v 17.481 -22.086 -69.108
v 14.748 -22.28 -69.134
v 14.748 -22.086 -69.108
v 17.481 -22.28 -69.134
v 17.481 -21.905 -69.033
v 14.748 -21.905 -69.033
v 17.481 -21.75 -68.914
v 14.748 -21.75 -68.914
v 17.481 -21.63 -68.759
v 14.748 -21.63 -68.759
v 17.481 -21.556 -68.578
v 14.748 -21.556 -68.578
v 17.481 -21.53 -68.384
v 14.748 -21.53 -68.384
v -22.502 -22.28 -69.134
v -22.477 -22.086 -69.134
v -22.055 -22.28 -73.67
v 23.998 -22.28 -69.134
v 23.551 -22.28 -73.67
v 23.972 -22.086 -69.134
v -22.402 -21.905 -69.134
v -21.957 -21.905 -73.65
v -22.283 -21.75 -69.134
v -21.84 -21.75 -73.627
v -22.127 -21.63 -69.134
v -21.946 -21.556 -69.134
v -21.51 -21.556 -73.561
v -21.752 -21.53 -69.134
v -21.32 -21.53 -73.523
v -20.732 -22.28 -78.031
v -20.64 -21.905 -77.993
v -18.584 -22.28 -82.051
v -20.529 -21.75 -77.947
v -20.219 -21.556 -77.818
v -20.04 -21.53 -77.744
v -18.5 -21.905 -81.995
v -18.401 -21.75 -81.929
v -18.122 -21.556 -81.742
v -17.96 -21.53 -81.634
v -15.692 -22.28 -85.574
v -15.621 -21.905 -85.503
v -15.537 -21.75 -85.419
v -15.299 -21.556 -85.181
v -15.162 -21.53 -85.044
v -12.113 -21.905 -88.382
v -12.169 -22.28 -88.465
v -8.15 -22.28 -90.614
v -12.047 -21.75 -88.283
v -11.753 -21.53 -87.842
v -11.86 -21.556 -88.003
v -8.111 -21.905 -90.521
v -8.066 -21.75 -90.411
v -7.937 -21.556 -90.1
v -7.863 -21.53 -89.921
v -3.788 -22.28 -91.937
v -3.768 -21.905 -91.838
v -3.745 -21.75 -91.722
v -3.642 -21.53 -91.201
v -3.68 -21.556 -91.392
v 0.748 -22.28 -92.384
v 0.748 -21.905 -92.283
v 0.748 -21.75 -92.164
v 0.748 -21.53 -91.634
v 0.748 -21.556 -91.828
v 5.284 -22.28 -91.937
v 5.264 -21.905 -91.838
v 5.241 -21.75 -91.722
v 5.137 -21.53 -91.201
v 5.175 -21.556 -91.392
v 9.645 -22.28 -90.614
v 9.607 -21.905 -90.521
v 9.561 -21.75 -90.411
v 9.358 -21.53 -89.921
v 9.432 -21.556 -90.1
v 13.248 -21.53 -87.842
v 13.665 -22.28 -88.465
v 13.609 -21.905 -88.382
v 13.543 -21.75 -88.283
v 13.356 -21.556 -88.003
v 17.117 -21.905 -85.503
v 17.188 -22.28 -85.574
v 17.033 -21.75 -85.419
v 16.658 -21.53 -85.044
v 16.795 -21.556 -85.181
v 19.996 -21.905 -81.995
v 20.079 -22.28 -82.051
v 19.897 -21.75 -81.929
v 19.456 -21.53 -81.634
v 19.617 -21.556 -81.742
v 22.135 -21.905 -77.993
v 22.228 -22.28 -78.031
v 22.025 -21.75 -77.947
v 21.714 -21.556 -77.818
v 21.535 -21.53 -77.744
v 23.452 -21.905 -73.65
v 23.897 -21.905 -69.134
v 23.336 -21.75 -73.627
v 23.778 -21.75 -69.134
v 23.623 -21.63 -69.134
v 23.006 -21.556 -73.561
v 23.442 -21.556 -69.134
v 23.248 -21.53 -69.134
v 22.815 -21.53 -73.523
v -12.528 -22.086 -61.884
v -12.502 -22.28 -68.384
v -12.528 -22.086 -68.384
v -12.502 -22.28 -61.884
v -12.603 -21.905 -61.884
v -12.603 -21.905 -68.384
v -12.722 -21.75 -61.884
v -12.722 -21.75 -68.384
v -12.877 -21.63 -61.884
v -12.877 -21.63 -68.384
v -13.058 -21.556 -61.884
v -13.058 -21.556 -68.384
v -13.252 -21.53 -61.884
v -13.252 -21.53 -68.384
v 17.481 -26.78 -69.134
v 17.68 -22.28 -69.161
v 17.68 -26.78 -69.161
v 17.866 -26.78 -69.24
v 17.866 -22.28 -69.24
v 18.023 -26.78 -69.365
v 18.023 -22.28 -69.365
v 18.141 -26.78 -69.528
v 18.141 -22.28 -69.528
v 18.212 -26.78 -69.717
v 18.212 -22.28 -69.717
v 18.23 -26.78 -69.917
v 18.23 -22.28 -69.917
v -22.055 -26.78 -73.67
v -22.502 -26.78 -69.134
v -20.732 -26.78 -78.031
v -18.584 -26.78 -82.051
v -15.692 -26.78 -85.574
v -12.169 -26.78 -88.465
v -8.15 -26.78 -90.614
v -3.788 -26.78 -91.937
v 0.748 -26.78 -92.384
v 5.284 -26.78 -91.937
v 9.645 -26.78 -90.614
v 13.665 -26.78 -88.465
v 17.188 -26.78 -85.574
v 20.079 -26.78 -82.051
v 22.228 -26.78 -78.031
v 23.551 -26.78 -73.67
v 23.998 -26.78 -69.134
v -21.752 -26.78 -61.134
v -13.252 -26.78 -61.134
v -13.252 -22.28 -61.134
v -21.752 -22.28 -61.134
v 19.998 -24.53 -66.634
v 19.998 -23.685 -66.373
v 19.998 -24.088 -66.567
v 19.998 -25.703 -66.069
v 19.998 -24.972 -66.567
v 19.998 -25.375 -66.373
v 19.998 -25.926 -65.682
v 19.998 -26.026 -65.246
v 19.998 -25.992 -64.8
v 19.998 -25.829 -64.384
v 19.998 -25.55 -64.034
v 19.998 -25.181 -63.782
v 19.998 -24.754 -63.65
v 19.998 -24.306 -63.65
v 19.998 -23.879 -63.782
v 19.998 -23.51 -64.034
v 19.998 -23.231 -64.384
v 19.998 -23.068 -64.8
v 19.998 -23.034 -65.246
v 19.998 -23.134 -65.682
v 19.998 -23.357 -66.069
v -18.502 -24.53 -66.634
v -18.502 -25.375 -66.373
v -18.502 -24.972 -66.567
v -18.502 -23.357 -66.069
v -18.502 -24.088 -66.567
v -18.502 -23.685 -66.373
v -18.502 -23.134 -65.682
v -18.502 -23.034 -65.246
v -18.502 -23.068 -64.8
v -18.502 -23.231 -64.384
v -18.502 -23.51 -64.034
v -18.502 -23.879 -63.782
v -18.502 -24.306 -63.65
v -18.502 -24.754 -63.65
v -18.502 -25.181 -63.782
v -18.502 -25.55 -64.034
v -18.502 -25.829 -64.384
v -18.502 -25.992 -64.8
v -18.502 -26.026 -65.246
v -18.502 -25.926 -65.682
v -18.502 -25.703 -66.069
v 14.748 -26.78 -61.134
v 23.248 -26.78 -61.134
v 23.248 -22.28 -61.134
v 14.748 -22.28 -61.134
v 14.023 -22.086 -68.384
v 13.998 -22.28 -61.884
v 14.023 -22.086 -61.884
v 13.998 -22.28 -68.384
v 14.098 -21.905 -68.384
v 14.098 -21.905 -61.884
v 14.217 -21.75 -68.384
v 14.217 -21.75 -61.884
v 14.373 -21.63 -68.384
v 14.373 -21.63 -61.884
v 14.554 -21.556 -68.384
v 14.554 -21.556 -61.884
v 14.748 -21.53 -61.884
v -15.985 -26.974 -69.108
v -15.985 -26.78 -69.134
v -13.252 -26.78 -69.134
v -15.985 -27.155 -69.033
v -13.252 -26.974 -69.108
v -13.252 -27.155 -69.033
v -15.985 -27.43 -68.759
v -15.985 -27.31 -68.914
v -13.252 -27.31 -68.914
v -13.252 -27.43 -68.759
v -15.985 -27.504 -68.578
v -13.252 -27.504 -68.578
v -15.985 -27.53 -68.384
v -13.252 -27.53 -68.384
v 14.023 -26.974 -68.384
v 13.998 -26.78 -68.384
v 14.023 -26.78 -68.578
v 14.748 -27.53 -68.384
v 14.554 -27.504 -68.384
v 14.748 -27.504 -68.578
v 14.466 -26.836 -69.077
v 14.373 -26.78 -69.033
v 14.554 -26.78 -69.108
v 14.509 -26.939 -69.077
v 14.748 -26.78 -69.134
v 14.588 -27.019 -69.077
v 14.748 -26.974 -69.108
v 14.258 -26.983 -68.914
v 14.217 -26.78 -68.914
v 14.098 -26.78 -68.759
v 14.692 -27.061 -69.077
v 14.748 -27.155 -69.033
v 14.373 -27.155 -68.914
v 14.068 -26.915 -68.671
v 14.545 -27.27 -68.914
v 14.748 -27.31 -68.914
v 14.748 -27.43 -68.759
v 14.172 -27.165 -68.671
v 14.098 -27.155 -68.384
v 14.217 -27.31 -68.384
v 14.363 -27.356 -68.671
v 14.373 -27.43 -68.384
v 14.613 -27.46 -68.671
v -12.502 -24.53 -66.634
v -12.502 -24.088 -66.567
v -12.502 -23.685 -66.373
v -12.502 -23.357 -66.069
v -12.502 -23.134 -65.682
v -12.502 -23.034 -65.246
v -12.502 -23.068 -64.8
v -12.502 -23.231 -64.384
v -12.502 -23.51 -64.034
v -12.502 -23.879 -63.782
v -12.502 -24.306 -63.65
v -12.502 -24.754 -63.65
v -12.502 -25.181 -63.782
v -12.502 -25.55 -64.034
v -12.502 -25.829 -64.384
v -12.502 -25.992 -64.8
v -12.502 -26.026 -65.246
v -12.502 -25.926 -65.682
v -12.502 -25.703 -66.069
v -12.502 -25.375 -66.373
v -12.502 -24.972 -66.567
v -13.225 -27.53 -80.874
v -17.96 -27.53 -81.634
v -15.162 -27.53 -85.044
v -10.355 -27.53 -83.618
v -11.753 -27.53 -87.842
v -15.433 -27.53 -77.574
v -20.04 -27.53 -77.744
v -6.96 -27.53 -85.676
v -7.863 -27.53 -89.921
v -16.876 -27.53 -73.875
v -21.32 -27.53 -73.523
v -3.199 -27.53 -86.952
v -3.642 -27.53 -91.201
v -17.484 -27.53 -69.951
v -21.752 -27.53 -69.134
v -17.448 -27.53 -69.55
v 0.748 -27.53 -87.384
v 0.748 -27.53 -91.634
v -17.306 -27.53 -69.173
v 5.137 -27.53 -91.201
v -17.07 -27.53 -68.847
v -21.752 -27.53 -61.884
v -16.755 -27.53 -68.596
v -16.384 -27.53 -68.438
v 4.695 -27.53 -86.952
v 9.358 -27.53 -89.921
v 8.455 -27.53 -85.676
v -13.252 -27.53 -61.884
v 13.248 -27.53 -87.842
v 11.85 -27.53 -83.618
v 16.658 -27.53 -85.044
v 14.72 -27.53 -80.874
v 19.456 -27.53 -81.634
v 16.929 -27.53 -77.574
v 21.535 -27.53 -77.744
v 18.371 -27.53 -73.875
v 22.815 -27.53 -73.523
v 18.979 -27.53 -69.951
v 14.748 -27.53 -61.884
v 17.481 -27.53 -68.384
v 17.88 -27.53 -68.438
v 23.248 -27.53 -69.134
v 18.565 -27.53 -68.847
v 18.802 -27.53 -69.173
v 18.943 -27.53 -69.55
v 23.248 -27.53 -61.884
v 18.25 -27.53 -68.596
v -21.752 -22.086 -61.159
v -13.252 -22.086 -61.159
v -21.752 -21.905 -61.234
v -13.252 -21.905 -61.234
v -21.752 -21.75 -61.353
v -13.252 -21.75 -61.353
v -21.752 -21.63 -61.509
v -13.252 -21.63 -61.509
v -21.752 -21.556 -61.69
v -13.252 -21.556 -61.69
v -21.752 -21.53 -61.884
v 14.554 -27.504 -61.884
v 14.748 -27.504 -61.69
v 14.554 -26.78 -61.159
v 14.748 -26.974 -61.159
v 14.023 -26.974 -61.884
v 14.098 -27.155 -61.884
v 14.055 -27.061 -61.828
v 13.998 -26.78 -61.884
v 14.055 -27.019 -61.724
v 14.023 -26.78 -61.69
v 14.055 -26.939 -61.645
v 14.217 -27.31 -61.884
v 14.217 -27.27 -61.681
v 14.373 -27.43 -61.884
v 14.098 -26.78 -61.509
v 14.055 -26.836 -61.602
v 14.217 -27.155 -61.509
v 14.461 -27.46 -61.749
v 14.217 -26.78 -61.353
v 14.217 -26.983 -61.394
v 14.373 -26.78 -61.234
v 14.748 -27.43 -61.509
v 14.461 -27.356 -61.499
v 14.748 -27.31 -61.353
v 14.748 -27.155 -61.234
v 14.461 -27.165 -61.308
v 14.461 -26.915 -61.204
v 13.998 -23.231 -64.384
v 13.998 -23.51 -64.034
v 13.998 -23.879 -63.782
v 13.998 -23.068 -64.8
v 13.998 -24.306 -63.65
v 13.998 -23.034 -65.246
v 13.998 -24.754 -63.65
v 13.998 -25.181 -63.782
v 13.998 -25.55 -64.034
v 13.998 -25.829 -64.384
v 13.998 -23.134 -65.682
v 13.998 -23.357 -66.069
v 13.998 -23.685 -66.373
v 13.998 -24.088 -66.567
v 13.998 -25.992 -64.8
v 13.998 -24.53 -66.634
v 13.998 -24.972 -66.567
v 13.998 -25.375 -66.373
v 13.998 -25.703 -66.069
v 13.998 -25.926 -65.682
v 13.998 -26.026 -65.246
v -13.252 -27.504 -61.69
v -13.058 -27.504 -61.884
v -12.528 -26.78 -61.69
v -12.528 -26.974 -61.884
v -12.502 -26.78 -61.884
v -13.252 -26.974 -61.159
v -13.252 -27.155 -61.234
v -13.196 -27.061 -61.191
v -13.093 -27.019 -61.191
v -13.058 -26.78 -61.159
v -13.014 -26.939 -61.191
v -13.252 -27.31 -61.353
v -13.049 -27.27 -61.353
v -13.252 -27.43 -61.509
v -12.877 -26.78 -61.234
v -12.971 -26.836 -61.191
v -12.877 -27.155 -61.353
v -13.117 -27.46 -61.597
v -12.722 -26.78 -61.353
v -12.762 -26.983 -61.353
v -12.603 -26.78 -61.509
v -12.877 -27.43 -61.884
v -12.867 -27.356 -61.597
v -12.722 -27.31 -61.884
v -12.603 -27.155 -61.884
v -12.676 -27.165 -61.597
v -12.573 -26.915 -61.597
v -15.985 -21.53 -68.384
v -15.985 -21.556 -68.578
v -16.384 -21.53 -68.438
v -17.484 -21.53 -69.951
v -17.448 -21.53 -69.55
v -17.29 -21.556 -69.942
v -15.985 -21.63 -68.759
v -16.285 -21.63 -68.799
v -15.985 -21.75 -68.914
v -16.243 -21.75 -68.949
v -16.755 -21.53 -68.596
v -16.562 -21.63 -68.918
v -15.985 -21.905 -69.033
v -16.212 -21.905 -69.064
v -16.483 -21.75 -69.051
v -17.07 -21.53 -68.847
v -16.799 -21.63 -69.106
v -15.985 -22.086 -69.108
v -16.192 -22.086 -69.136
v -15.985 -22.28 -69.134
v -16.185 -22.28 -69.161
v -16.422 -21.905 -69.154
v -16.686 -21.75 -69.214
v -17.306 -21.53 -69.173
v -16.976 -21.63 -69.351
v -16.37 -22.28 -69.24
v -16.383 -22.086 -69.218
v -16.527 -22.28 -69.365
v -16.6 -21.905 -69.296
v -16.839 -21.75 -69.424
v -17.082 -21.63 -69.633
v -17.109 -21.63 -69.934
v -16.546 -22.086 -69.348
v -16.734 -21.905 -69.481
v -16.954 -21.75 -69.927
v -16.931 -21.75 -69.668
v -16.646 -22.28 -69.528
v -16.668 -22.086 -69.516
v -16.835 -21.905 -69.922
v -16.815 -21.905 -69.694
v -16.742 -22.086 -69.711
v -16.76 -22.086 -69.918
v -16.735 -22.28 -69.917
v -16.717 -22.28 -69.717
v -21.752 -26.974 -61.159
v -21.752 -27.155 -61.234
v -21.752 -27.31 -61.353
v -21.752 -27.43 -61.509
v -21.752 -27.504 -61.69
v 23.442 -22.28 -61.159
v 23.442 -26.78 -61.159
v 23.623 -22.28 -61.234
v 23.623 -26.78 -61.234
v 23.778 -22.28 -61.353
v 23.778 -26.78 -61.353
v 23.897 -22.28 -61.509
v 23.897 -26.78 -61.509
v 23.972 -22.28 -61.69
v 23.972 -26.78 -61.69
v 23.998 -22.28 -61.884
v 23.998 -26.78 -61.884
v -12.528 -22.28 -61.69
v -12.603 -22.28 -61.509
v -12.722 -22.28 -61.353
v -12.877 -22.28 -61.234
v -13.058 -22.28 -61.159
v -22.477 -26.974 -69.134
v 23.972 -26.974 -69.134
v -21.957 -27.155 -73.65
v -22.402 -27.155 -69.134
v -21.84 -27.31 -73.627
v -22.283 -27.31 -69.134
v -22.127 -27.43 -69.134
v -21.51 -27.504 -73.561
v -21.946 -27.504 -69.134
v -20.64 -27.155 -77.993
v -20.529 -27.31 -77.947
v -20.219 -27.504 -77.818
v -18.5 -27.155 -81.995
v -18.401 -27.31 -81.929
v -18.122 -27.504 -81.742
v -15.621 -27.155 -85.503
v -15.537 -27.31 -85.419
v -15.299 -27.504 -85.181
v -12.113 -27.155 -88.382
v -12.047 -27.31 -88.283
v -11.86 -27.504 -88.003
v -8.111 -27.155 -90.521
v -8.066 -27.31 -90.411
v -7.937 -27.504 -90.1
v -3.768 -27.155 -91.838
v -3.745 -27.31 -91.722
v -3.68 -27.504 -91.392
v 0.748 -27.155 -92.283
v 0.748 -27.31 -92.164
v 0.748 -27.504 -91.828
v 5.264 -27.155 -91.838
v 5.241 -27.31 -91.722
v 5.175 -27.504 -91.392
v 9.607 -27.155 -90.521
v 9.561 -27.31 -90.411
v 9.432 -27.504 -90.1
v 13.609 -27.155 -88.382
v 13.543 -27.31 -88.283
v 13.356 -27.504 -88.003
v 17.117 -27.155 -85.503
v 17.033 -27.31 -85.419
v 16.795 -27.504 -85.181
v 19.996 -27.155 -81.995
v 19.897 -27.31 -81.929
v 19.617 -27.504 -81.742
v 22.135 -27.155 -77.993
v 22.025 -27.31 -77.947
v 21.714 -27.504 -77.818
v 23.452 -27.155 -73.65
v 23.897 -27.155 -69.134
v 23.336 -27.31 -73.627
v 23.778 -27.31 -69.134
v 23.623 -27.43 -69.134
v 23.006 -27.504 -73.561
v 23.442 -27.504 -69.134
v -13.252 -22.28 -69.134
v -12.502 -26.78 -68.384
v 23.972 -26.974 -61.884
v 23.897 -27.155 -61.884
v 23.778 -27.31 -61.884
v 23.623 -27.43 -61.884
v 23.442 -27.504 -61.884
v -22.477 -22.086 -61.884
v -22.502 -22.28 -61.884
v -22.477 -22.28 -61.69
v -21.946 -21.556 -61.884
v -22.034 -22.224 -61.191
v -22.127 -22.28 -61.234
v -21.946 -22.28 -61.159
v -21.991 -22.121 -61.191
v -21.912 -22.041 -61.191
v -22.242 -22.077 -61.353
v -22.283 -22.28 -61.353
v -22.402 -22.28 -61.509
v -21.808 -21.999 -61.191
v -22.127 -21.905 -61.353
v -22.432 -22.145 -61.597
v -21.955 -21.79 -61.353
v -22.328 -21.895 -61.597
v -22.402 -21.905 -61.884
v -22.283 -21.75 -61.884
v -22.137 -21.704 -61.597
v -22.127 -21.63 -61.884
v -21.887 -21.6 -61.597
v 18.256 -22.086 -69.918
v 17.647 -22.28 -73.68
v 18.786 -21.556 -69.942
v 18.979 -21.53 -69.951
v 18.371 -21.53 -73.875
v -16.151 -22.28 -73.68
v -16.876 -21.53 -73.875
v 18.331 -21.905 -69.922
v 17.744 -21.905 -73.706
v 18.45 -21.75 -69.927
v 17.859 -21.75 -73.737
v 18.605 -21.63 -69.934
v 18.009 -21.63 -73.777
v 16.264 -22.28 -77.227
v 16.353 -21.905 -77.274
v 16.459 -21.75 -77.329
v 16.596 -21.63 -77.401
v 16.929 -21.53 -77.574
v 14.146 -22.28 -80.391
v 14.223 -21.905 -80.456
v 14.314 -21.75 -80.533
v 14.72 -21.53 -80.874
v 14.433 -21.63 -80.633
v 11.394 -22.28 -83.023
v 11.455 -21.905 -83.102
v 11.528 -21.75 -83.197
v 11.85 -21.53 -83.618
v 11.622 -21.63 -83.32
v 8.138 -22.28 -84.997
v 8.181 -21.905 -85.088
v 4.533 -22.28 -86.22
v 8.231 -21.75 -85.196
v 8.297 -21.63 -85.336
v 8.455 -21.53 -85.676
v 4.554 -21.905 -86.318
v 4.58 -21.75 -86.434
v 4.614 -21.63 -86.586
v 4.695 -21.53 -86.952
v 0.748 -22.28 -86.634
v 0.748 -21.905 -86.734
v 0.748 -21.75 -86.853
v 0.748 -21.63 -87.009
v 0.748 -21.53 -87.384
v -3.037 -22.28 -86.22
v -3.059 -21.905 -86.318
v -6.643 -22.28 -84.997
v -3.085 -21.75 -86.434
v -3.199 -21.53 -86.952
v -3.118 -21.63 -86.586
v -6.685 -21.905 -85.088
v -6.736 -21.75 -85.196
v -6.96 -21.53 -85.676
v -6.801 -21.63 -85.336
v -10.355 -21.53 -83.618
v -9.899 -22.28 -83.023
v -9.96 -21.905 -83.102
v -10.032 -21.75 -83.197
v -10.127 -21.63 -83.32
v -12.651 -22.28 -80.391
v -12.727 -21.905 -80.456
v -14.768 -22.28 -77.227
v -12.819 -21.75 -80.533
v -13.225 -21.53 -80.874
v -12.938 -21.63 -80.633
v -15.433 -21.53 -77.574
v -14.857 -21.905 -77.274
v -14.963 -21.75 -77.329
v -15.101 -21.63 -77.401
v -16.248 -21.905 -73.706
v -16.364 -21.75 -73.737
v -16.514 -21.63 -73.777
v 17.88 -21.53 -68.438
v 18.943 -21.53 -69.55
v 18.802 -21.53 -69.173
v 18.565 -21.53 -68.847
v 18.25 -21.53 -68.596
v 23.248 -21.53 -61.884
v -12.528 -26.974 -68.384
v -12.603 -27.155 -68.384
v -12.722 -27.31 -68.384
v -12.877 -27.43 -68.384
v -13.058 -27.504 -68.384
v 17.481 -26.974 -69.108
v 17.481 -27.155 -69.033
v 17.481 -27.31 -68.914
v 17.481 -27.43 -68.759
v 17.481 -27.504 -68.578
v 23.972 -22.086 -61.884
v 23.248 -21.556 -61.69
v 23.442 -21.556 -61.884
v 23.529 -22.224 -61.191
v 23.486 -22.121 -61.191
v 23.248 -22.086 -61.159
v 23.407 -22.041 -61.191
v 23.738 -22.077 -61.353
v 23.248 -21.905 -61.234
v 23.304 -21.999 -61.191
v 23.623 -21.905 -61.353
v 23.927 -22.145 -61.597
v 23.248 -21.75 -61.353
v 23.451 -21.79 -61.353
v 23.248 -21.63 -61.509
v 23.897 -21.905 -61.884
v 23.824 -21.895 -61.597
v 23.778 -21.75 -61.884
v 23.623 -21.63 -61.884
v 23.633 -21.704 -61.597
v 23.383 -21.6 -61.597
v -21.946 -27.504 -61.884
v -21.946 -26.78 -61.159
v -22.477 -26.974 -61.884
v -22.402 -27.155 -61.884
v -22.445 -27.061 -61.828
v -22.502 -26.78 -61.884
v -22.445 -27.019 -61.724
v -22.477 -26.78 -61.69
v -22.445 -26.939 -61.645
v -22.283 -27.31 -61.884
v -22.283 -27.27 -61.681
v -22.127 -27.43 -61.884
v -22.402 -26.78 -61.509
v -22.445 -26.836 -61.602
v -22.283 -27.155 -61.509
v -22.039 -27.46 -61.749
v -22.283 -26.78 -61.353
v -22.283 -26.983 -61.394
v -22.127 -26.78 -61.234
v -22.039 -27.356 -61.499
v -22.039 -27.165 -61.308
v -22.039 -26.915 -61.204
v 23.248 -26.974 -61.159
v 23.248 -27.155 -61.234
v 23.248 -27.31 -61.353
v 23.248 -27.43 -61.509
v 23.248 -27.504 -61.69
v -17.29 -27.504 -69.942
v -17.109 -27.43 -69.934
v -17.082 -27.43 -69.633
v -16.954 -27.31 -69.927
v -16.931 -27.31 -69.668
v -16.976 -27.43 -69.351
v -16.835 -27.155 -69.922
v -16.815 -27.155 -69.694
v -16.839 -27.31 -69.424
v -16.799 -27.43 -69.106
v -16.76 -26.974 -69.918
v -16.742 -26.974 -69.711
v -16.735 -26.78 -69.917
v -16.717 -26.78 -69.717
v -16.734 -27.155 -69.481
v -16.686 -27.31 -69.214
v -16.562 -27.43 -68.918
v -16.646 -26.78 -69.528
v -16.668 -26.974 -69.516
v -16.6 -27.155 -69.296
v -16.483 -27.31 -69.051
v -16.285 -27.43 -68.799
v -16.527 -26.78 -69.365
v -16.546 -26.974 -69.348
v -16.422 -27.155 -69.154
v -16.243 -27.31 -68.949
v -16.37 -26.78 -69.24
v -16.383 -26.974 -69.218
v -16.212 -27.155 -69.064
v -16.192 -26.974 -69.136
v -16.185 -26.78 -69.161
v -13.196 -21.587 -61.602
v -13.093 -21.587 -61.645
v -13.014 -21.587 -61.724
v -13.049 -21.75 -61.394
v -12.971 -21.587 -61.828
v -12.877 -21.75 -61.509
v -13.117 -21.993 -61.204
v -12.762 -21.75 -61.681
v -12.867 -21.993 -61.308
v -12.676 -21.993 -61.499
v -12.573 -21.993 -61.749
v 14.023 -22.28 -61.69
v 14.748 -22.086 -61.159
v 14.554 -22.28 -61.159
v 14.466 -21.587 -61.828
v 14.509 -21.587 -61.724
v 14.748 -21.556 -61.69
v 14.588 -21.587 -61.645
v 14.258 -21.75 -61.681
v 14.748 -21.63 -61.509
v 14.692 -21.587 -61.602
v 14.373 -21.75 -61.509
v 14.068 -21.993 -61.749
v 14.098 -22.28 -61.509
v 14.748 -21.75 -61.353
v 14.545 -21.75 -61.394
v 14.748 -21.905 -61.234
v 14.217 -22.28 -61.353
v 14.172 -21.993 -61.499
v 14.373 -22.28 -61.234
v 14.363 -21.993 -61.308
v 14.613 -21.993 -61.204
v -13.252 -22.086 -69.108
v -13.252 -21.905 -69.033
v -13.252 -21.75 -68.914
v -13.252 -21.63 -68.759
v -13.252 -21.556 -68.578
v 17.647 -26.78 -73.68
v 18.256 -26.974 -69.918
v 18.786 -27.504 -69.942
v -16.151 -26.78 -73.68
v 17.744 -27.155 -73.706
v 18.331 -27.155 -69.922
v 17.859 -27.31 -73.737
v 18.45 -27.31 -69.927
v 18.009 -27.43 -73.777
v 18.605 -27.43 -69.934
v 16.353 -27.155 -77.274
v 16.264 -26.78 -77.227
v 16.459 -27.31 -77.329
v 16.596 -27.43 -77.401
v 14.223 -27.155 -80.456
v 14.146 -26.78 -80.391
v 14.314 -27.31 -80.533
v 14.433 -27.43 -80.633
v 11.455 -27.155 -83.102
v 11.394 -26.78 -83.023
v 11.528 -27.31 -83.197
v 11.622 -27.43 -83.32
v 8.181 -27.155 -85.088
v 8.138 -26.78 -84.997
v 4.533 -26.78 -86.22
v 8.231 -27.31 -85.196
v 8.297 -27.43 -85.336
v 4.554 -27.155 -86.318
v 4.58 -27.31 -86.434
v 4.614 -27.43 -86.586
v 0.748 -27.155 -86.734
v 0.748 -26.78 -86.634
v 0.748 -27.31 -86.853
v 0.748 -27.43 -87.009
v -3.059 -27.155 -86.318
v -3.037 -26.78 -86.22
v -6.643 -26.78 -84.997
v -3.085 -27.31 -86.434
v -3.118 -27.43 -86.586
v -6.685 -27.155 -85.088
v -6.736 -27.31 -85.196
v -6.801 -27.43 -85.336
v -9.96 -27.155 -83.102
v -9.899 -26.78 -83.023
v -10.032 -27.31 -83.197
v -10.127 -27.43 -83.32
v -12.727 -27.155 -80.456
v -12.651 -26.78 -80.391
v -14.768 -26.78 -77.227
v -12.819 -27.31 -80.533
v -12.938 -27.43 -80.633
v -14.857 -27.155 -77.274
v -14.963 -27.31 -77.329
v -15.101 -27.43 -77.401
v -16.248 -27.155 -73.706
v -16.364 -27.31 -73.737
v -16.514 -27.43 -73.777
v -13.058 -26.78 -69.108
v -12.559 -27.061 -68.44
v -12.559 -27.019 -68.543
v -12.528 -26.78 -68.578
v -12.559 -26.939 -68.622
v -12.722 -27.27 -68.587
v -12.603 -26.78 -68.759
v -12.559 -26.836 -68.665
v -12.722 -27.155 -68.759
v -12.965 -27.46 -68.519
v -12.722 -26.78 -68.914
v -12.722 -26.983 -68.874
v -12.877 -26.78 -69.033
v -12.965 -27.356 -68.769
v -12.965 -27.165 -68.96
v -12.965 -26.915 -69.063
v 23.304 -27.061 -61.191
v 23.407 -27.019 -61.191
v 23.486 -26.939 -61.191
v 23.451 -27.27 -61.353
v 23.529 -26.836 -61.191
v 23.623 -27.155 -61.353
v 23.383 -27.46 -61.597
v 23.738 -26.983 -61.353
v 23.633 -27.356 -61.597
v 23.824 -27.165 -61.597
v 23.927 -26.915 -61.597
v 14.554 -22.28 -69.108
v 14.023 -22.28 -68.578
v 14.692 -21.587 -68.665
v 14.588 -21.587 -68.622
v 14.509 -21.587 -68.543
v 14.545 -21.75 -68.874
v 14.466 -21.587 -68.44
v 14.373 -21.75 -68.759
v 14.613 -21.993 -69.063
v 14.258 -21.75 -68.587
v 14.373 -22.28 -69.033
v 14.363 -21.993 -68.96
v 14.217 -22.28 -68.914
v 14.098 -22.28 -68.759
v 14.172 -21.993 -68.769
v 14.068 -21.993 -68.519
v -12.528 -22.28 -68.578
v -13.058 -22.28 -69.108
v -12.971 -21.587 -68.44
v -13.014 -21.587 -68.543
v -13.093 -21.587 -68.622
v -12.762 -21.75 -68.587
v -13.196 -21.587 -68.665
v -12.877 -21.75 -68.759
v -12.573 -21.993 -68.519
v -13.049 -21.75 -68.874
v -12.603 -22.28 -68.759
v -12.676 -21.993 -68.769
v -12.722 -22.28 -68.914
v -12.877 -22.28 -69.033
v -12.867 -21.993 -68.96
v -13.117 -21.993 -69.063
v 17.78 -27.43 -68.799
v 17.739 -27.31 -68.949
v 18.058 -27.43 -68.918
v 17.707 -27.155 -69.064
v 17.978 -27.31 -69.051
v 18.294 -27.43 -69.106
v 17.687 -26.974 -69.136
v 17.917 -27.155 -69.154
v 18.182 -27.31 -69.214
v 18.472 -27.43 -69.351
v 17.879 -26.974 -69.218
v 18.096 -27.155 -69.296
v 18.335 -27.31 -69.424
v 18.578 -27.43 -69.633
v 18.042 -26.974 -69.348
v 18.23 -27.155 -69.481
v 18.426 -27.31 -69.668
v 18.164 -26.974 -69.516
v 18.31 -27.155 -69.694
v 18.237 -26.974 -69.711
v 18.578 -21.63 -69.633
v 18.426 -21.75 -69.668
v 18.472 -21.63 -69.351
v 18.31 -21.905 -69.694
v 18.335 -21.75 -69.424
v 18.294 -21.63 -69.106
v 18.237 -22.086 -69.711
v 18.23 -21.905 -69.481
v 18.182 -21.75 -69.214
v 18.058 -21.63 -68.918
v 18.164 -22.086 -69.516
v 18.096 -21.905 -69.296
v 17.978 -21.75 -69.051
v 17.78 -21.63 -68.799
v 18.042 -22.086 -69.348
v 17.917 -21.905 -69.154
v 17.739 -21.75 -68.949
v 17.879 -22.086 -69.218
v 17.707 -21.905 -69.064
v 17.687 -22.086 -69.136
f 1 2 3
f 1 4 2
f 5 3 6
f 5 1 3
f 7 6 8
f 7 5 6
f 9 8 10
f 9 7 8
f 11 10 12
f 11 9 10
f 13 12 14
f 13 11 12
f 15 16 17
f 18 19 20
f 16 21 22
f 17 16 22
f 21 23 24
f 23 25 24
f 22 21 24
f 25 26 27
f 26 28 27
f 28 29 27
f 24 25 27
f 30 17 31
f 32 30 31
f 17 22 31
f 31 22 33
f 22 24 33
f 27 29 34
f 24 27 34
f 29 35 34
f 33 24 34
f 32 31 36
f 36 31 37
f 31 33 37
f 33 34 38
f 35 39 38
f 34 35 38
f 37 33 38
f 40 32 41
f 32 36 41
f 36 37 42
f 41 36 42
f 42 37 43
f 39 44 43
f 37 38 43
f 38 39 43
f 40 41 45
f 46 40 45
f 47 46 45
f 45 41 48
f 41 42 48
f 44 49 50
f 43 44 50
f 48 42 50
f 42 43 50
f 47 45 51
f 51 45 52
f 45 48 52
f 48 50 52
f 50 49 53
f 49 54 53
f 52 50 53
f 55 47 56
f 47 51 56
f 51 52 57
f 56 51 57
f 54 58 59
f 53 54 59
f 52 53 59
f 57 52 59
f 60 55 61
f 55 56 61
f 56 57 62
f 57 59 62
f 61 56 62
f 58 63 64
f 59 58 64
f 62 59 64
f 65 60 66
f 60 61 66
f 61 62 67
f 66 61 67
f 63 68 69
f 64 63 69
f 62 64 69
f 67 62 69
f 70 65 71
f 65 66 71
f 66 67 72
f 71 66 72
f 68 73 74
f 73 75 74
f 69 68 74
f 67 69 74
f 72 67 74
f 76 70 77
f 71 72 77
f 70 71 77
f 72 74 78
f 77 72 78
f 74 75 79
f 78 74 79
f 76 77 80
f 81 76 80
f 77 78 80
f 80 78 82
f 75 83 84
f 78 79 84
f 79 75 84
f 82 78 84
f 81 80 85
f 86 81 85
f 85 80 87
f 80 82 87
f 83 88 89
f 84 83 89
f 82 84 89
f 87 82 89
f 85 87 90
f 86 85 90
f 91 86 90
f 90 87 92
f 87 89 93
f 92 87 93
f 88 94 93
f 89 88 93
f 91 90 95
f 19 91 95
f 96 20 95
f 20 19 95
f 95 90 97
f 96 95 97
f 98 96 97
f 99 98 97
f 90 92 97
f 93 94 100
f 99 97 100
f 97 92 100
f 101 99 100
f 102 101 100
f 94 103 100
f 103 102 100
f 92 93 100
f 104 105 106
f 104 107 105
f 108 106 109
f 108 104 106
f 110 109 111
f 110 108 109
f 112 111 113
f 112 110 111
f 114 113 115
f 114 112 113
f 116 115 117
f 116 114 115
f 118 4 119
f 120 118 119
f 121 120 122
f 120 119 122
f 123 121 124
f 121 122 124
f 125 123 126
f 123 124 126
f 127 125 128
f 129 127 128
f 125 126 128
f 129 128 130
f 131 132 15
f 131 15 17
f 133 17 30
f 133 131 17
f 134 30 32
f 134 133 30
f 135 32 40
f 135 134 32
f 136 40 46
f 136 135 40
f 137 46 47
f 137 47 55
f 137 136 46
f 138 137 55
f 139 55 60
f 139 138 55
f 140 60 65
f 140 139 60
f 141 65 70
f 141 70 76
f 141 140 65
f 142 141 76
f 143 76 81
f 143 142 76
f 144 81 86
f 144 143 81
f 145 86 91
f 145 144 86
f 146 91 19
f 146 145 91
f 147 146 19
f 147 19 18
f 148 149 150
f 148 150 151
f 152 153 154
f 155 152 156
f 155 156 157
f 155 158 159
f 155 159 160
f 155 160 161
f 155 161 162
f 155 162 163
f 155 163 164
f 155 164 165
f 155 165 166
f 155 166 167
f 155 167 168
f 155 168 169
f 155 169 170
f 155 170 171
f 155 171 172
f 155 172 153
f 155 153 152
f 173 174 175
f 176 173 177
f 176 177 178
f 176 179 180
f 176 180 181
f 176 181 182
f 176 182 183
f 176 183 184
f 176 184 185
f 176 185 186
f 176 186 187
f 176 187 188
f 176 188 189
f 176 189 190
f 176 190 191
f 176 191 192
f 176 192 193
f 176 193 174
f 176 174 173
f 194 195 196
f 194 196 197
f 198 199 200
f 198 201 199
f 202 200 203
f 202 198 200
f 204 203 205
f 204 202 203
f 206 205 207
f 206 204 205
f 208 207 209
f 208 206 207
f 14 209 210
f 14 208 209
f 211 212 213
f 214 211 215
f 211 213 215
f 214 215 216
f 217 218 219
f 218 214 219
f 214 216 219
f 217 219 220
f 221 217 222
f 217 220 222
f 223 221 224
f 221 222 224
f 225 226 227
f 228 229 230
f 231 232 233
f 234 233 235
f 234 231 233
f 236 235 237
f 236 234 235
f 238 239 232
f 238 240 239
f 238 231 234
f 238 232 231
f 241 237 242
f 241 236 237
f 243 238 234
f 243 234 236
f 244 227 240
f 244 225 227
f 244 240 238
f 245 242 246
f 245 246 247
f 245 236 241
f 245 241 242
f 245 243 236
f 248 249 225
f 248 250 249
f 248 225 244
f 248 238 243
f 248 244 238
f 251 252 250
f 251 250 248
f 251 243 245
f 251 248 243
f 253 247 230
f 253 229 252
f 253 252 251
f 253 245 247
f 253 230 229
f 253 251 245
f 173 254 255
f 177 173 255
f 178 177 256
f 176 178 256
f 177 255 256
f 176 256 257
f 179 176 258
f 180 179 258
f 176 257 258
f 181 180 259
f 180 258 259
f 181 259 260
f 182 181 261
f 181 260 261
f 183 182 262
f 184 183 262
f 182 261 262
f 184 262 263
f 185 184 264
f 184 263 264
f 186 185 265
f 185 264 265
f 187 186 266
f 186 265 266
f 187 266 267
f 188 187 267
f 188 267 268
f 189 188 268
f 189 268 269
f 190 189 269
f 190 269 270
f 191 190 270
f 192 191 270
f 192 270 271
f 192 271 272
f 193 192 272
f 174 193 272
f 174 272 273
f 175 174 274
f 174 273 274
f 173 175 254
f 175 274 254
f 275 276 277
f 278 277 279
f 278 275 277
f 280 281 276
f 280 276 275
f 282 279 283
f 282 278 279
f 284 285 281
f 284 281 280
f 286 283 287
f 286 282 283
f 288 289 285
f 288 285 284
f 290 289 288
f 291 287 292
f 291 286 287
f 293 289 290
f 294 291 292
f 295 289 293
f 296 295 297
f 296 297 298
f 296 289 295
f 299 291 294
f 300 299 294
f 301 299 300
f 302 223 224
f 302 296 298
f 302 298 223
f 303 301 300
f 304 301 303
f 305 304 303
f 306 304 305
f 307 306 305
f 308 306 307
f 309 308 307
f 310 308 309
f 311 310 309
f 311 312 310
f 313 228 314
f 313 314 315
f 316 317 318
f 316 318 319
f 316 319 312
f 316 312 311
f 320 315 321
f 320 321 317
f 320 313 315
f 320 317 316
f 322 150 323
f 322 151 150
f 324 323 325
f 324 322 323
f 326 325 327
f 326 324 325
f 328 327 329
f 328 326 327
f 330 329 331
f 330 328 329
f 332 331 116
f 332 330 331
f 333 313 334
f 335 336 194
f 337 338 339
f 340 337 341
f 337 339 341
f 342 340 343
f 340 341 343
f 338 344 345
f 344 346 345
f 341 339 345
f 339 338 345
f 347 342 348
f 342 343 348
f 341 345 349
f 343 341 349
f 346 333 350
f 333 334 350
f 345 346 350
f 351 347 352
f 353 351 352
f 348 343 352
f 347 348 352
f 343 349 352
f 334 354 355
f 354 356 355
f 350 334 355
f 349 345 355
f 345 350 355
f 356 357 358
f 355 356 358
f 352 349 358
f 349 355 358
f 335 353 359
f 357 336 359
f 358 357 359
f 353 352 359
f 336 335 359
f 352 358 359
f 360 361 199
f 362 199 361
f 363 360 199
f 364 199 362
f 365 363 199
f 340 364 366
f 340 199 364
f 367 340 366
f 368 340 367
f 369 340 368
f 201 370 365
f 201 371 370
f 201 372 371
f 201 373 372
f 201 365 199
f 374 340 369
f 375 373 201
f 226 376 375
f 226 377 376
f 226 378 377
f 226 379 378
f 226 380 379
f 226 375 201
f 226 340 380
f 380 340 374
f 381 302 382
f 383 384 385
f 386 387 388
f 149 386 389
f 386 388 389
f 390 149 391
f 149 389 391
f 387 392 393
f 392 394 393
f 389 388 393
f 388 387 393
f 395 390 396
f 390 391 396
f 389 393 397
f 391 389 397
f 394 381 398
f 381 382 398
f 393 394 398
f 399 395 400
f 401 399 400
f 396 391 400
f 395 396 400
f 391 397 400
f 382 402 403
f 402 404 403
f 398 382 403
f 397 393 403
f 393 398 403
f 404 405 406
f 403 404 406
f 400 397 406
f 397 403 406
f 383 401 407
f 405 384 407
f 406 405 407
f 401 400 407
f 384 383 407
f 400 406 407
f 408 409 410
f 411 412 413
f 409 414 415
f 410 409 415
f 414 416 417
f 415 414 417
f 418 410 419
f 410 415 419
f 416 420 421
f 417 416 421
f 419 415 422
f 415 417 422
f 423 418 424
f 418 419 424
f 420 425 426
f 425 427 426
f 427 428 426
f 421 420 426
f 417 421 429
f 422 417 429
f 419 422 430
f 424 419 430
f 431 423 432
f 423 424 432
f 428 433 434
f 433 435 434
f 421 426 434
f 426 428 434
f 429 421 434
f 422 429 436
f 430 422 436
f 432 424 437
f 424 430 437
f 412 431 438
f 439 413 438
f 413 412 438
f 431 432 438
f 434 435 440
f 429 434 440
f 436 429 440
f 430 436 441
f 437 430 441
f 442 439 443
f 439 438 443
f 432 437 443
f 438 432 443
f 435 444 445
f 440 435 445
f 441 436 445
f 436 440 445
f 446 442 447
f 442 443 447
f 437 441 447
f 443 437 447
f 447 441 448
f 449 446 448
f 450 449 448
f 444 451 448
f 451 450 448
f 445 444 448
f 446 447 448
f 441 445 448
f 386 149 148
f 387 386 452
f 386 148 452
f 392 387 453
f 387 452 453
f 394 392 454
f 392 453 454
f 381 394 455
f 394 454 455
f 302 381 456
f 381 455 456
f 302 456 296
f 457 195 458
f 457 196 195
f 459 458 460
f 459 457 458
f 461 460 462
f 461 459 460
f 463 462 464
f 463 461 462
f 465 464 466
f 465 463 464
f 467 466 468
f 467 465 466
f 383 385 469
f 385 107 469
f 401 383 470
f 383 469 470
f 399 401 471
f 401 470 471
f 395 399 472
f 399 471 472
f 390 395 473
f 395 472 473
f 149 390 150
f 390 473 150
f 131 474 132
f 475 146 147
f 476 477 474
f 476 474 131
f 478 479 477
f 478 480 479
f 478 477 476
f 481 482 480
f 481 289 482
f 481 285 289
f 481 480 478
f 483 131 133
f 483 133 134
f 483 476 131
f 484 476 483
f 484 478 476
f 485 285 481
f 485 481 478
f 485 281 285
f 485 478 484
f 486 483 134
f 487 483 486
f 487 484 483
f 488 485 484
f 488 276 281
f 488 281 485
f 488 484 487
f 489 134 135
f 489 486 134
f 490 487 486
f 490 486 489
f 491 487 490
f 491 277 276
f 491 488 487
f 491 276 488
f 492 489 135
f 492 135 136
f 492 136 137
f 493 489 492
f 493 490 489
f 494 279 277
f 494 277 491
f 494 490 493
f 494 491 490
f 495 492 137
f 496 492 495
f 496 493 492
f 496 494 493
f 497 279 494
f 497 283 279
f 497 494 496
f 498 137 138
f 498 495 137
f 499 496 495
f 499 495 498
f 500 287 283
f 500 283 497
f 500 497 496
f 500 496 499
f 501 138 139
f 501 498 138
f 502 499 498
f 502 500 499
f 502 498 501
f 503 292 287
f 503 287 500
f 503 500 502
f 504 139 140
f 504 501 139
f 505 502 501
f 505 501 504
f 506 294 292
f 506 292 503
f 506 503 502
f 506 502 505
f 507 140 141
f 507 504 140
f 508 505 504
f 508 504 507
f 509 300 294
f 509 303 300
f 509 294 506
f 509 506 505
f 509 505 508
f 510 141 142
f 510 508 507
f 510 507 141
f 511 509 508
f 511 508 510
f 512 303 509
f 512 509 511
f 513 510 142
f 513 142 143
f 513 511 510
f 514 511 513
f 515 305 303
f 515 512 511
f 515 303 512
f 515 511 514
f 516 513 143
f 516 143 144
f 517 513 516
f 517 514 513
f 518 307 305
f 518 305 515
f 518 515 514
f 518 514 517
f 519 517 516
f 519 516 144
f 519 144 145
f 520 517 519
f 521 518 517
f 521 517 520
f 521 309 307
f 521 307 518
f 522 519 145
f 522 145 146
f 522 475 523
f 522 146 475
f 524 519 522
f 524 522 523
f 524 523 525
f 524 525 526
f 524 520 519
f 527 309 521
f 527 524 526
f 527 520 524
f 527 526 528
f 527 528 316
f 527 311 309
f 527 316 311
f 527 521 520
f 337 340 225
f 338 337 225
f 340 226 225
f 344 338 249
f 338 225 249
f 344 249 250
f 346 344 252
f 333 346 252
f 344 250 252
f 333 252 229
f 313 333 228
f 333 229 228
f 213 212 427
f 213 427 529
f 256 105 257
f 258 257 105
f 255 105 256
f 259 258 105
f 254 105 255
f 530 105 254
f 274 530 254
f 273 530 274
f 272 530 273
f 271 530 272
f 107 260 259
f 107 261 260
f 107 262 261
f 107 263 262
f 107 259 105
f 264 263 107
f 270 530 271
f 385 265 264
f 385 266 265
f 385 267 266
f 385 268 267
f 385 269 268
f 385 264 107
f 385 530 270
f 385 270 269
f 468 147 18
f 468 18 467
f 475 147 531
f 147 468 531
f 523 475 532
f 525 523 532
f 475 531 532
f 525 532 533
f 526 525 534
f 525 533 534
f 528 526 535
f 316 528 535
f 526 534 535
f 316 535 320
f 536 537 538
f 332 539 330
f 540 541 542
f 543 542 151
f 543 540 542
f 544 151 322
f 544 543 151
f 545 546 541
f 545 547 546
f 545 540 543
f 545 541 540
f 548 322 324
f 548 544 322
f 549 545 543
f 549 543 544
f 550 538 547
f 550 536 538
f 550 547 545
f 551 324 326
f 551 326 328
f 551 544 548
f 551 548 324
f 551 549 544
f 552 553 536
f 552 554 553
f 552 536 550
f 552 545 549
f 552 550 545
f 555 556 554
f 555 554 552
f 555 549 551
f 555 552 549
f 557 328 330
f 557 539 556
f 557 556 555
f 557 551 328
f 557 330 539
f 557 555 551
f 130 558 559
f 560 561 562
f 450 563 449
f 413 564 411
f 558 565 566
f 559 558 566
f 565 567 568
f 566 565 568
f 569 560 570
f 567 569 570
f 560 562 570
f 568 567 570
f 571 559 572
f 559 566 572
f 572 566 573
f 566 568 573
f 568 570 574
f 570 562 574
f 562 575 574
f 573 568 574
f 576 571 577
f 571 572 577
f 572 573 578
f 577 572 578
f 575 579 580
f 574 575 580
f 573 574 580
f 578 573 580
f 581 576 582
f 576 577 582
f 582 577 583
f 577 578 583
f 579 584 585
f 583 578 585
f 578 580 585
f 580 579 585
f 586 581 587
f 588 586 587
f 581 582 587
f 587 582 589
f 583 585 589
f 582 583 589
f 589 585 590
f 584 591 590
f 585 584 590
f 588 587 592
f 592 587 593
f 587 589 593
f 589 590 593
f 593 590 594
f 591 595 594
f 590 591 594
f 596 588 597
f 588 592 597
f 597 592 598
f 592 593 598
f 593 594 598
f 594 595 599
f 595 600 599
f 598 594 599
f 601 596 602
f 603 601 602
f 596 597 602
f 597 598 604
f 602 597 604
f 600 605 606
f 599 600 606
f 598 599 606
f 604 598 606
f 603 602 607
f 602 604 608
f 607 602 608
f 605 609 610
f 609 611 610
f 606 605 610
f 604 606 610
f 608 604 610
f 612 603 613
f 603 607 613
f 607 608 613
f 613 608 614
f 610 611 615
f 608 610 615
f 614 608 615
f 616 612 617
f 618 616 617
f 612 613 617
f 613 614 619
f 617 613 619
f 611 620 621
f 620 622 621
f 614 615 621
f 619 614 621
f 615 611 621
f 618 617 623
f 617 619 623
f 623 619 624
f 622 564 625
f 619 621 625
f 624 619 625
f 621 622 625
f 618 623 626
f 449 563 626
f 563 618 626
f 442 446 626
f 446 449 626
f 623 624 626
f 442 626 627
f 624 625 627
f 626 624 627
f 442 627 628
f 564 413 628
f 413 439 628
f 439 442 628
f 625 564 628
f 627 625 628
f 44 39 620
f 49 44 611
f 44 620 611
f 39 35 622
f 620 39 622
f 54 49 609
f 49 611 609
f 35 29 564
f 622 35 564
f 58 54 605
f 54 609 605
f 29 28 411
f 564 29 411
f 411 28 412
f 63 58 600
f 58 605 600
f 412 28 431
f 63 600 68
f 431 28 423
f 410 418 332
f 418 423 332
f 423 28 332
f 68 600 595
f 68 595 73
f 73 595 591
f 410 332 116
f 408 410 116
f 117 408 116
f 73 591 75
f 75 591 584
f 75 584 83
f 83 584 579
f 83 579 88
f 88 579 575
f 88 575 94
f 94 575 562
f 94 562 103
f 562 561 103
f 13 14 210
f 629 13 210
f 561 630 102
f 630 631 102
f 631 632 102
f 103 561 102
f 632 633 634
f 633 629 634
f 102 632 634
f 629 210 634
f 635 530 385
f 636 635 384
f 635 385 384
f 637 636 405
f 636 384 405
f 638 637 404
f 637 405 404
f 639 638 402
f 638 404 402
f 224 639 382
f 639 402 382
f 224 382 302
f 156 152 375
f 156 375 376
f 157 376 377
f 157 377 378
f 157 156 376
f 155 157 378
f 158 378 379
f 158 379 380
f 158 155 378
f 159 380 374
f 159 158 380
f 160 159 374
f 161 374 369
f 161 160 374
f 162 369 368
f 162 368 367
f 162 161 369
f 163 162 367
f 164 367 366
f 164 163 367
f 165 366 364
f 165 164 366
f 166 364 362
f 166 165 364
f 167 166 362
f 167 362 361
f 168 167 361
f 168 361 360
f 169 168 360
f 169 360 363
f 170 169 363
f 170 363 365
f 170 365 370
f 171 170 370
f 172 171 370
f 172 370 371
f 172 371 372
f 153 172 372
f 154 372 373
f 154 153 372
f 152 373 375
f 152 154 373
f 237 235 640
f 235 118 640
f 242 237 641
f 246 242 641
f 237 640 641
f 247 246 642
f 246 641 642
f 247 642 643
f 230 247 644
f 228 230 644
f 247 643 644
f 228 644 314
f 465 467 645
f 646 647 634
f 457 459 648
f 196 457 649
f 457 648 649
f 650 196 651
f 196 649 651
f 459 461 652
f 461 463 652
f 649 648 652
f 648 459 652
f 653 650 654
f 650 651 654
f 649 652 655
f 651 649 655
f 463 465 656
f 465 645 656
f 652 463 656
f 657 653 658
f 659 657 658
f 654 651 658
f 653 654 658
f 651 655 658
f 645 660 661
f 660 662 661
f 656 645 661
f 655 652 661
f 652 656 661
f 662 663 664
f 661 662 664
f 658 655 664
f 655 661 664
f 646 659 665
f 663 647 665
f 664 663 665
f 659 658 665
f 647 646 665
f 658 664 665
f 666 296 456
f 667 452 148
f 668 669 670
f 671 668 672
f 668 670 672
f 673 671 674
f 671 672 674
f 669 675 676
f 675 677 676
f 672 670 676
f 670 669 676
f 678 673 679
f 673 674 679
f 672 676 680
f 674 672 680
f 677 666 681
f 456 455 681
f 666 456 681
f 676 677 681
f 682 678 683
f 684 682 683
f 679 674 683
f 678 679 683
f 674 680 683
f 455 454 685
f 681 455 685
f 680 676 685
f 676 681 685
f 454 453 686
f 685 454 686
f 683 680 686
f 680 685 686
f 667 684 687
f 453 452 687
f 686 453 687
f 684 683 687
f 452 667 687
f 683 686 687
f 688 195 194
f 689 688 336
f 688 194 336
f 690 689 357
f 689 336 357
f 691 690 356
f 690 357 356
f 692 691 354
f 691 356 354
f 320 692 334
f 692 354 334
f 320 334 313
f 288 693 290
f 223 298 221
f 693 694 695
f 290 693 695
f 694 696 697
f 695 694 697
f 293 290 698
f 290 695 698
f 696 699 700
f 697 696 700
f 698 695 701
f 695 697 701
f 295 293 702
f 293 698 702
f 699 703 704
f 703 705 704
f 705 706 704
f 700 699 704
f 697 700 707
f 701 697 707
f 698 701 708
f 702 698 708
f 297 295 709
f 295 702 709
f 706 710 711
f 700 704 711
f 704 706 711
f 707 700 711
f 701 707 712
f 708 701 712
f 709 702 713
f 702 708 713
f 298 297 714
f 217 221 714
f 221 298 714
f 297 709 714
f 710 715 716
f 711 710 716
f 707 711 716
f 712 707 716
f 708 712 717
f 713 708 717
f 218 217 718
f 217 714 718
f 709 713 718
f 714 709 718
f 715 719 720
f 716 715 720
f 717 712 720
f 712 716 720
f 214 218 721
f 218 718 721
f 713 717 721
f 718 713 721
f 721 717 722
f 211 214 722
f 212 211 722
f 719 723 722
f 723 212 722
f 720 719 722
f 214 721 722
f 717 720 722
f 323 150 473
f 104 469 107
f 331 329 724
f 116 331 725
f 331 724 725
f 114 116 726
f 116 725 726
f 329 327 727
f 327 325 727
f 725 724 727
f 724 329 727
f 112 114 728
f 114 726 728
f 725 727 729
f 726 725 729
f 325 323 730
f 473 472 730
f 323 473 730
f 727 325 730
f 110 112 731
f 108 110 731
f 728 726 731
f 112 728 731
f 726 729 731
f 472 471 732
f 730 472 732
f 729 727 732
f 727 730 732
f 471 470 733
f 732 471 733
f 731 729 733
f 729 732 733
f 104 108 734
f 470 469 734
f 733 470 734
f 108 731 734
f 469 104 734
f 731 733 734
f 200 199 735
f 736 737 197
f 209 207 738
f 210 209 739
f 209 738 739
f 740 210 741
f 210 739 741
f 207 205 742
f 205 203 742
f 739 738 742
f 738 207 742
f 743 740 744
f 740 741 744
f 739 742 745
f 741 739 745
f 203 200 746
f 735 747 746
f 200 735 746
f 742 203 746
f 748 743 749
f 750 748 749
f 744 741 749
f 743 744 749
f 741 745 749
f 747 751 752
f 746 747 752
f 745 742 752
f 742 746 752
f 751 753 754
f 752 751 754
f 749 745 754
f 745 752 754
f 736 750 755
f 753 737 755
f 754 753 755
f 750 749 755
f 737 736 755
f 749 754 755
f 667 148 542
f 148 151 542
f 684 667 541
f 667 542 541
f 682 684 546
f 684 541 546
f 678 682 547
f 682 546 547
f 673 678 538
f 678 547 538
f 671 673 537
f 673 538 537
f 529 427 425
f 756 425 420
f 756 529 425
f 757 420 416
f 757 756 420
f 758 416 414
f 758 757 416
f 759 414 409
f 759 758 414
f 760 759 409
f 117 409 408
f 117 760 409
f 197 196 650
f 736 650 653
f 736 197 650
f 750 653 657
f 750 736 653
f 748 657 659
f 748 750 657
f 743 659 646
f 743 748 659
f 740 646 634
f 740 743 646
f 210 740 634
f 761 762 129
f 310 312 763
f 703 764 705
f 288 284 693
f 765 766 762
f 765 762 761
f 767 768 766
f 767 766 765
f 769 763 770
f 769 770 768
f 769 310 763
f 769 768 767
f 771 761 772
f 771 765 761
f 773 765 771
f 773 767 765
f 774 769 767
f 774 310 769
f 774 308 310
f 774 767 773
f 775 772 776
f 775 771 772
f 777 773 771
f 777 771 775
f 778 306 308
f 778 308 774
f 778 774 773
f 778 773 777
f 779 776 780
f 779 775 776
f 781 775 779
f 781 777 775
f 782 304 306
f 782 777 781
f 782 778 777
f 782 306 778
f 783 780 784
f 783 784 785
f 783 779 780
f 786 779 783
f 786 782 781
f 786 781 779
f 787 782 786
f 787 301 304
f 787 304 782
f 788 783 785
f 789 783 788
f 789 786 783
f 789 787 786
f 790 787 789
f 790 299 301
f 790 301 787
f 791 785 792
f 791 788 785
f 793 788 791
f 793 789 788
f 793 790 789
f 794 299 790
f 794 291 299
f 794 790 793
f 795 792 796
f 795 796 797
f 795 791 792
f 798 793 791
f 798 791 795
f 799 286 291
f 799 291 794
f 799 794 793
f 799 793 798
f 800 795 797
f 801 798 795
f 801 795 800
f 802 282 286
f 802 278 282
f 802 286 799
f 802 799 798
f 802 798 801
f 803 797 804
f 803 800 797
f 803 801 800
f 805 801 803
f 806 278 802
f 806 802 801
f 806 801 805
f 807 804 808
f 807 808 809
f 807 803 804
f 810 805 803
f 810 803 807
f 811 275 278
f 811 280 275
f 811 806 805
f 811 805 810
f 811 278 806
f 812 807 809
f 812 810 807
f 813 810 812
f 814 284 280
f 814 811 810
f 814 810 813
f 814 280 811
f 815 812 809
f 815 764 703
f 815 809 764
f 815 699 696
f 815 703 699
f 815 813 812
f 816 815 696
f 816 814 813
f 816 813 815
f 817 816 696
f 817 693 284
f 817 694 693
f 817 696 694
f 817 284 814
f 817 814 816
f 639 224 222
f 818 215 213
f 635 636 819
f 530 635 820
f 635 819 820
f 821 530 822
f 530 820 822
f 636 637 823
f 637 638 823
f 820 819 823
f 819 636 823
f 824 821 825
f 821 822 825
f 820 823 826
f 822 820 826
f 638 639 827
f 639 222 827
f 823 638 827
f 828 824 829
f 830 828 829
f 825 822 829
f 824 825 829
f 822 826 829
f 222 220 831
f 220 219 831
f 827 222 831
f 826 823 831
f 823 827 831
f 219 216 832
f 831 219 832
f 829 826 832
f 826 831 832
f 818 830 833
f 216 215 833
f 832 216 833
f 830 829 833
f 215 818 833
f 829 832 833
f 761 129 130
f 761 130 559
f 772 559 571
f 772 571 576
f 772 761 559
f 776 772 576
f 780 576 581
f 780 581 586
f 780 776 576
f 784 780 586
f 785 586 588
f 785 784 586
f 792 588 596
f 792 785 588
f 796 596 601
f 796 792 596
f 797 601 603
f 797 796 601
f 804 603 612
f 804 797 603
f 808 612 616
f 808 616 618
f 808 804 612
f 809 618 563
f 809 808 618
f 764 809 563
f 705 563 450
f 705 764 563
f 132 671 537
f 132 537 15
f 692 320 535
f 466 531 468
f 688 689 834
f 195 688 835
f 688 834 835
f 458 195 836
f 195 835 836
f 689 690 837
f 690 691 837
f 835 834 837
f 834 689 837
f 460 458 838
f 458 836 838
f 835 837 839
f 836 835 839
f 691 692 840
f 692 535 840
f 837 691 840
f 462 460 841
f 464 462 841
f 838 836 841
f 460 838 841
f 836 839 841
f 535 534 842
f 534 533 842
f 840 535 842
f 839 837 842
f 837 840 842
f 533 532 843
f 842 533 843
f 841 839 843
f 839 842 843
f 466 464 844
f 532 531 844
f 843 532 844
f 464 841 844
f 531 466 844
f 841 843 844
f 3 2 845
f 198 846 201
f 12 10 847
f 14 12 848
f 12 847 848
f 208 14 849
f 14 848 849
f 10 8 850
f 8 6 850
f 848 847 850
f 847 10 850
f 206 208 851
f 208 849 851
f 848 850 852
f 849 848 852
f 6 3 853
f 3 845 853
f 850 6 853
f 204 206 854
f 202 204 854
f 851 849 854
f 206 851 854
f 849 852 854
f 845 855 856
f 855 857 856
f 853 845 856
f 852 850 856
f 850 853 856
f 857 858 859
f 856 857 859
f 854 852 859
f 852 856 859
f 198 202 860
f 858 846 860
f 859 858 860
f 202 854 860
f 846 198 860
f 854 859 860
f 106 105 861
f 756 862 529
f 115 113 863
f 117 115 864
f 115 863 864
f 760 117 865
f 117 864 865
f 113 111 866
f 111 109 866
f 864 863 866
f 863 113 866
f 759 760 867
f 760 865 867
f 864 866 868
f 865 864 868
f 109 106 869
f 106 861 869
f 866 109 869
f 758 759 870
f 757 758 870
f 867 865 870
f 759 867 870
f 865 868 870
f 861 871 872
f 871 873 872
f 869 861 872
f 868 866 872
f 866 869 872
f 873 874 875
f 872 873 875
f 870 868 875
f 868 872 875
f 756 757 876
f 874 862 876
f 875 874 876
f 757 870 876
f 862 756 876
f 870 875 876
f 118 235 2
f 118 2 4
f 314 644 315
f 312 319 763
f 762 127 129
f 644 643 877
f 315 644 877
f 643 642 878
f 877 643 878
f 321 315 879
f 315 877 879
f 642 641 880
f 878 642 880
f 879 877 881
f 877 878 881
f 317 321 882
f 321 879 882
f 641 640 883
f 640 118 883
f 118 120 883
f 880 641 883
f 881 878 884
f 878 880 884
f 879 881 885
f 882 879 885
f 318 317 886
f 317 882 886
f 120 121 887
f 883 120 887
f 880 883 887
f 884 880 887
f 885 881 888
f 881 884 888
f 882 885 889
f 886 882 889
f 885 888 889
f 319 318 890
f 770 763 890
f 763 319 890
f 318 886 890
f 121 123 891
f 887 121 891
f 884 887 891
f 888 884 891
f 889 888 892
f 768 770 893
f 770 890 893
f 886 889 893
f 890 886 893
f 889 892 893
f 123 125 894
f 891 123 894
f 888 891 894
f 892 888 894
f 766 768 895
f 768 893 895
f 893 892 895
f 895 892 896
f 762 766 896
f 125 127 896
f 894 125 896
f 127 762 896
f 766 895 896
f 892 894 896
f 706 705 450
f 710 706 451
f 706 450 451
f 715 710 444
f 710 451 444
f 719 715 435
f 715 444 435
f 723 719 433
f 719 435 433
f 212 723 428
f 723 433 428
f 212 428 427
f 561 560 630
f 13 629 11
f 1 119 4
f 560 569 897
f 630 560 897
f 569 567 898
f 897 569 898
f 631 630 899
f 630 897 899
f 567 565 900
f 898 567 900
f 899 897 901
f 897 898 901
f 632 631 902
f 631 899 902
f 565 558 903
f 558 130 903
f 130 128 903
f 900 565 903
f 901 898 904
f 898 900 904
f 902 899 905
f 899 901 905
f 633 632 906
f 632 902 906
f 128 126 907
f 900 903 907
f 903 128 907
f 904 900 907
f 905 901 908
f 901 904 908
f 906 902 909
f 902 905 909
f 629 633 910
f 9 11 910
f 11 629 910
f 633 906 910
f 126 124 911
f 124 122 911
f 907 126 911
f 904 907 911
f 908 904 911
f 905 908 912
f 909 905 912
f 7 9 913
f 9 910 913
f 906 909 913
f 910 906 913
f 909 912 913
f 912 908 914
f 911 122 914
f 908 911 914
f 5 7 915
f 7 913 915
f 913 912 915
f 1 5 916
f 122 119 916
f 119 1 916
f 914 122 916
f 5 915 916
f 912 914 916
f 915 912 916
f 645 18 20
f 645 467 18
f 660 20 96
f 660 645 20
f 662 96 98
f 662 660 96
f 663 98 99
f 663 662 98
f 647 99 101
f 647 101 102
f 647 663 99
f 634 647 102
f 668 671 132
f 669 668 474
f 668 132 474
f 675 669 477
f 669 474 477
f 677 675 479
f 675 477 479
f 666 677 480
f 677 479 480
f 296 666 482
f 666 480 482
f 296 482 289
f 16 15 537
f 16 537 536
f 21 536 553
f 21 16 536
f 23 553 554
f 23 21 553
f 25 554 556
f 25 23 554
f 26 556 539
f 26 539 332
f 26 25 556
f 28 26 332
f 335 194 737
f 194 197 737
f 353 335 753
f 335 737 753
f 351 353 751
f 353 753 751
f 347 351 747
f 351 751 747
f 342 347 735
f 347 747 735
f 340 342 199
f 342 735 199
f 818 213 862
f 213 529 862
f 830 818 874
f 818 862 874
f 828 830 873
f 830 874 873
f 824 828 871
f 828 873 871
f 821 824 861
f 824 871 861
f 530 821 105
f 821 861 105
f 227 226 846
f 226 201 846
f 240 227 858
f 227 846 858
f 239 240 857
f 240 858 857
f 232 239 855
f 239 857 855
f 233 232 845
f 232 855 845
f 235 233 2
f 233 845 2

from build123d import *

# Parameters (mm, degrees)
BOSS_EXTRU_1_DEPTH      = 6
CONG_1_R                = 0.75
ESQUISSE2_R             = 1.5
ENL_V_MAT_EXTRU_1_DEPTH = 6
ENL_V_START             = -6
ESQUISSE3_R             = 1.5
ENL_V_MAT_EXTRU_2_DEPTH = 6


with BuildPart() as part:
    # Esquisse1 → Boss.-Extru.1 (new body)
    with BuildSketch(Plane(origin=(0, -27.53, 0), x_dir=(-1, 0, 0), z_dir=(0, 1, 0))):
        with BuildLine():
            Line((-23.997779507, -61.133700741), (-13.997779507, -61.133700741))
            Line((-13.997779507, -61.133700741), (-13.997779507, -69.133700741))
            Line((-13.997779507, -69.133700741), (-18.247779507, -69.133700741))
            ThreePointArc((-18.247779507, -69.133700741), (-0.747779507, -86.633700741), (16.752220493, -69.133700741))
            Line((16.752220493, -69.133700741), (12.502220493, -69.133700741))
            Line((12.502220493, -69.133700741), (12.502220493, -61.133700741))
            Line((12.502220493, -61.133700741), (22.502220493, -61.133700741))
            Line((22.502220493, -61.133700741), (22.502220493, -69.133700741))
            ThreePointArc((22.502220493, -69.133700741), (-0.747779507, -92.383700741), (-23.997779507, -69.133700741))
            Line((-23.997779507, -69.133700741), (-23.997779507, -61.133700741))
        make_face()
    extrude(amount=BOSS_EXTRU_1_DEPTH)

    # Congé1
    cong_1_edges = [part.edges().sort_by_distance(p)[0] for p in [
        (23.997779507, -21.53, -65.133700741),
        (-14.627220493, -27.53, -69.133700741),
        (-12.502220493, -27.53, -65.133700741),
        (-17.502220493, -27.53, -61.133700741),
        (-22.502220493, -27.53, -65.133700741),
        (0.747779507, -27.53, -92.383700741),
        (23.997779507, -27.53, -65.133700741),
        (18.997779507, -27.53, -61.133700741),
        (13.997779507, -27.53, -65.133700741),
        (0.747779507, -21.53, -92.383700741),
        (-22.502220493, -21.53, -65.133700741),
        (13.997779507, -24.53, -69.133700741),
        (18.247779507, -24.53, -69.133700741),
        (-16.752220493, -24.53, -69.133700741),
        (-12.502220493, -24.53, -69.133700741),
        (-12.502220493, -24.53, -61.133700741),
        (-22.502220493, -24.53, -61.133700741),
        (23.997779507, -24.53, -61.133700741),
        (13.997779507, -24.53, -61.133700741),
        (-17.502220493, -21.53, -61.133700741),
        (-12.502220493, -21.53, -65.133700741),
        (-14.627220493, -21.53, -69.133700741),
        (0.747779507, -21.53, -86.633700741),
        (16.122779507, -21.53, -69.133700741),
        (13.997779507, -21.53, -65.133700741),
        (18.997779507, -21.53, -61.133700741),
        (16.122779507, -27.53, -69.133700741),
        (0.747779507, -27.53, -86.633700741),
    ]]
    fillet(cong_1_edges, radius=CONG_1_R)

    # Esquisse2 → Enlèv. mat.-Extru.1 (cut)
    with BuildSketch(Plane(origin=(-12.502220493, 0, 0), x_dir=(0, 0, -1), z_dir=(1, 0, 0))):
        with Locations((65.133700741, -24.53)):
            Circle(ESQUISSE2_R)
    extrude(amount=-ENL_V_MAT_EXTRU_1_DEPTH, mode=Mode.SUBTRACT)

    # Esquisse3 → Enlèv. mat.-Extru.2 (cut)
    with BuildSketch(Plane.ZY.offset(-13.997779507).offset(ENL_V_START)):
        with Locations(Location((-65.133700741, -24.53, 0), (0, 0, 180))):
            Circle(ESQUISSE3_R)
    extrude(amount=ENL_V_MAT_EXTRU_2_DEPTH, mode=Mode.SUBTRACT)


solid = part.part
